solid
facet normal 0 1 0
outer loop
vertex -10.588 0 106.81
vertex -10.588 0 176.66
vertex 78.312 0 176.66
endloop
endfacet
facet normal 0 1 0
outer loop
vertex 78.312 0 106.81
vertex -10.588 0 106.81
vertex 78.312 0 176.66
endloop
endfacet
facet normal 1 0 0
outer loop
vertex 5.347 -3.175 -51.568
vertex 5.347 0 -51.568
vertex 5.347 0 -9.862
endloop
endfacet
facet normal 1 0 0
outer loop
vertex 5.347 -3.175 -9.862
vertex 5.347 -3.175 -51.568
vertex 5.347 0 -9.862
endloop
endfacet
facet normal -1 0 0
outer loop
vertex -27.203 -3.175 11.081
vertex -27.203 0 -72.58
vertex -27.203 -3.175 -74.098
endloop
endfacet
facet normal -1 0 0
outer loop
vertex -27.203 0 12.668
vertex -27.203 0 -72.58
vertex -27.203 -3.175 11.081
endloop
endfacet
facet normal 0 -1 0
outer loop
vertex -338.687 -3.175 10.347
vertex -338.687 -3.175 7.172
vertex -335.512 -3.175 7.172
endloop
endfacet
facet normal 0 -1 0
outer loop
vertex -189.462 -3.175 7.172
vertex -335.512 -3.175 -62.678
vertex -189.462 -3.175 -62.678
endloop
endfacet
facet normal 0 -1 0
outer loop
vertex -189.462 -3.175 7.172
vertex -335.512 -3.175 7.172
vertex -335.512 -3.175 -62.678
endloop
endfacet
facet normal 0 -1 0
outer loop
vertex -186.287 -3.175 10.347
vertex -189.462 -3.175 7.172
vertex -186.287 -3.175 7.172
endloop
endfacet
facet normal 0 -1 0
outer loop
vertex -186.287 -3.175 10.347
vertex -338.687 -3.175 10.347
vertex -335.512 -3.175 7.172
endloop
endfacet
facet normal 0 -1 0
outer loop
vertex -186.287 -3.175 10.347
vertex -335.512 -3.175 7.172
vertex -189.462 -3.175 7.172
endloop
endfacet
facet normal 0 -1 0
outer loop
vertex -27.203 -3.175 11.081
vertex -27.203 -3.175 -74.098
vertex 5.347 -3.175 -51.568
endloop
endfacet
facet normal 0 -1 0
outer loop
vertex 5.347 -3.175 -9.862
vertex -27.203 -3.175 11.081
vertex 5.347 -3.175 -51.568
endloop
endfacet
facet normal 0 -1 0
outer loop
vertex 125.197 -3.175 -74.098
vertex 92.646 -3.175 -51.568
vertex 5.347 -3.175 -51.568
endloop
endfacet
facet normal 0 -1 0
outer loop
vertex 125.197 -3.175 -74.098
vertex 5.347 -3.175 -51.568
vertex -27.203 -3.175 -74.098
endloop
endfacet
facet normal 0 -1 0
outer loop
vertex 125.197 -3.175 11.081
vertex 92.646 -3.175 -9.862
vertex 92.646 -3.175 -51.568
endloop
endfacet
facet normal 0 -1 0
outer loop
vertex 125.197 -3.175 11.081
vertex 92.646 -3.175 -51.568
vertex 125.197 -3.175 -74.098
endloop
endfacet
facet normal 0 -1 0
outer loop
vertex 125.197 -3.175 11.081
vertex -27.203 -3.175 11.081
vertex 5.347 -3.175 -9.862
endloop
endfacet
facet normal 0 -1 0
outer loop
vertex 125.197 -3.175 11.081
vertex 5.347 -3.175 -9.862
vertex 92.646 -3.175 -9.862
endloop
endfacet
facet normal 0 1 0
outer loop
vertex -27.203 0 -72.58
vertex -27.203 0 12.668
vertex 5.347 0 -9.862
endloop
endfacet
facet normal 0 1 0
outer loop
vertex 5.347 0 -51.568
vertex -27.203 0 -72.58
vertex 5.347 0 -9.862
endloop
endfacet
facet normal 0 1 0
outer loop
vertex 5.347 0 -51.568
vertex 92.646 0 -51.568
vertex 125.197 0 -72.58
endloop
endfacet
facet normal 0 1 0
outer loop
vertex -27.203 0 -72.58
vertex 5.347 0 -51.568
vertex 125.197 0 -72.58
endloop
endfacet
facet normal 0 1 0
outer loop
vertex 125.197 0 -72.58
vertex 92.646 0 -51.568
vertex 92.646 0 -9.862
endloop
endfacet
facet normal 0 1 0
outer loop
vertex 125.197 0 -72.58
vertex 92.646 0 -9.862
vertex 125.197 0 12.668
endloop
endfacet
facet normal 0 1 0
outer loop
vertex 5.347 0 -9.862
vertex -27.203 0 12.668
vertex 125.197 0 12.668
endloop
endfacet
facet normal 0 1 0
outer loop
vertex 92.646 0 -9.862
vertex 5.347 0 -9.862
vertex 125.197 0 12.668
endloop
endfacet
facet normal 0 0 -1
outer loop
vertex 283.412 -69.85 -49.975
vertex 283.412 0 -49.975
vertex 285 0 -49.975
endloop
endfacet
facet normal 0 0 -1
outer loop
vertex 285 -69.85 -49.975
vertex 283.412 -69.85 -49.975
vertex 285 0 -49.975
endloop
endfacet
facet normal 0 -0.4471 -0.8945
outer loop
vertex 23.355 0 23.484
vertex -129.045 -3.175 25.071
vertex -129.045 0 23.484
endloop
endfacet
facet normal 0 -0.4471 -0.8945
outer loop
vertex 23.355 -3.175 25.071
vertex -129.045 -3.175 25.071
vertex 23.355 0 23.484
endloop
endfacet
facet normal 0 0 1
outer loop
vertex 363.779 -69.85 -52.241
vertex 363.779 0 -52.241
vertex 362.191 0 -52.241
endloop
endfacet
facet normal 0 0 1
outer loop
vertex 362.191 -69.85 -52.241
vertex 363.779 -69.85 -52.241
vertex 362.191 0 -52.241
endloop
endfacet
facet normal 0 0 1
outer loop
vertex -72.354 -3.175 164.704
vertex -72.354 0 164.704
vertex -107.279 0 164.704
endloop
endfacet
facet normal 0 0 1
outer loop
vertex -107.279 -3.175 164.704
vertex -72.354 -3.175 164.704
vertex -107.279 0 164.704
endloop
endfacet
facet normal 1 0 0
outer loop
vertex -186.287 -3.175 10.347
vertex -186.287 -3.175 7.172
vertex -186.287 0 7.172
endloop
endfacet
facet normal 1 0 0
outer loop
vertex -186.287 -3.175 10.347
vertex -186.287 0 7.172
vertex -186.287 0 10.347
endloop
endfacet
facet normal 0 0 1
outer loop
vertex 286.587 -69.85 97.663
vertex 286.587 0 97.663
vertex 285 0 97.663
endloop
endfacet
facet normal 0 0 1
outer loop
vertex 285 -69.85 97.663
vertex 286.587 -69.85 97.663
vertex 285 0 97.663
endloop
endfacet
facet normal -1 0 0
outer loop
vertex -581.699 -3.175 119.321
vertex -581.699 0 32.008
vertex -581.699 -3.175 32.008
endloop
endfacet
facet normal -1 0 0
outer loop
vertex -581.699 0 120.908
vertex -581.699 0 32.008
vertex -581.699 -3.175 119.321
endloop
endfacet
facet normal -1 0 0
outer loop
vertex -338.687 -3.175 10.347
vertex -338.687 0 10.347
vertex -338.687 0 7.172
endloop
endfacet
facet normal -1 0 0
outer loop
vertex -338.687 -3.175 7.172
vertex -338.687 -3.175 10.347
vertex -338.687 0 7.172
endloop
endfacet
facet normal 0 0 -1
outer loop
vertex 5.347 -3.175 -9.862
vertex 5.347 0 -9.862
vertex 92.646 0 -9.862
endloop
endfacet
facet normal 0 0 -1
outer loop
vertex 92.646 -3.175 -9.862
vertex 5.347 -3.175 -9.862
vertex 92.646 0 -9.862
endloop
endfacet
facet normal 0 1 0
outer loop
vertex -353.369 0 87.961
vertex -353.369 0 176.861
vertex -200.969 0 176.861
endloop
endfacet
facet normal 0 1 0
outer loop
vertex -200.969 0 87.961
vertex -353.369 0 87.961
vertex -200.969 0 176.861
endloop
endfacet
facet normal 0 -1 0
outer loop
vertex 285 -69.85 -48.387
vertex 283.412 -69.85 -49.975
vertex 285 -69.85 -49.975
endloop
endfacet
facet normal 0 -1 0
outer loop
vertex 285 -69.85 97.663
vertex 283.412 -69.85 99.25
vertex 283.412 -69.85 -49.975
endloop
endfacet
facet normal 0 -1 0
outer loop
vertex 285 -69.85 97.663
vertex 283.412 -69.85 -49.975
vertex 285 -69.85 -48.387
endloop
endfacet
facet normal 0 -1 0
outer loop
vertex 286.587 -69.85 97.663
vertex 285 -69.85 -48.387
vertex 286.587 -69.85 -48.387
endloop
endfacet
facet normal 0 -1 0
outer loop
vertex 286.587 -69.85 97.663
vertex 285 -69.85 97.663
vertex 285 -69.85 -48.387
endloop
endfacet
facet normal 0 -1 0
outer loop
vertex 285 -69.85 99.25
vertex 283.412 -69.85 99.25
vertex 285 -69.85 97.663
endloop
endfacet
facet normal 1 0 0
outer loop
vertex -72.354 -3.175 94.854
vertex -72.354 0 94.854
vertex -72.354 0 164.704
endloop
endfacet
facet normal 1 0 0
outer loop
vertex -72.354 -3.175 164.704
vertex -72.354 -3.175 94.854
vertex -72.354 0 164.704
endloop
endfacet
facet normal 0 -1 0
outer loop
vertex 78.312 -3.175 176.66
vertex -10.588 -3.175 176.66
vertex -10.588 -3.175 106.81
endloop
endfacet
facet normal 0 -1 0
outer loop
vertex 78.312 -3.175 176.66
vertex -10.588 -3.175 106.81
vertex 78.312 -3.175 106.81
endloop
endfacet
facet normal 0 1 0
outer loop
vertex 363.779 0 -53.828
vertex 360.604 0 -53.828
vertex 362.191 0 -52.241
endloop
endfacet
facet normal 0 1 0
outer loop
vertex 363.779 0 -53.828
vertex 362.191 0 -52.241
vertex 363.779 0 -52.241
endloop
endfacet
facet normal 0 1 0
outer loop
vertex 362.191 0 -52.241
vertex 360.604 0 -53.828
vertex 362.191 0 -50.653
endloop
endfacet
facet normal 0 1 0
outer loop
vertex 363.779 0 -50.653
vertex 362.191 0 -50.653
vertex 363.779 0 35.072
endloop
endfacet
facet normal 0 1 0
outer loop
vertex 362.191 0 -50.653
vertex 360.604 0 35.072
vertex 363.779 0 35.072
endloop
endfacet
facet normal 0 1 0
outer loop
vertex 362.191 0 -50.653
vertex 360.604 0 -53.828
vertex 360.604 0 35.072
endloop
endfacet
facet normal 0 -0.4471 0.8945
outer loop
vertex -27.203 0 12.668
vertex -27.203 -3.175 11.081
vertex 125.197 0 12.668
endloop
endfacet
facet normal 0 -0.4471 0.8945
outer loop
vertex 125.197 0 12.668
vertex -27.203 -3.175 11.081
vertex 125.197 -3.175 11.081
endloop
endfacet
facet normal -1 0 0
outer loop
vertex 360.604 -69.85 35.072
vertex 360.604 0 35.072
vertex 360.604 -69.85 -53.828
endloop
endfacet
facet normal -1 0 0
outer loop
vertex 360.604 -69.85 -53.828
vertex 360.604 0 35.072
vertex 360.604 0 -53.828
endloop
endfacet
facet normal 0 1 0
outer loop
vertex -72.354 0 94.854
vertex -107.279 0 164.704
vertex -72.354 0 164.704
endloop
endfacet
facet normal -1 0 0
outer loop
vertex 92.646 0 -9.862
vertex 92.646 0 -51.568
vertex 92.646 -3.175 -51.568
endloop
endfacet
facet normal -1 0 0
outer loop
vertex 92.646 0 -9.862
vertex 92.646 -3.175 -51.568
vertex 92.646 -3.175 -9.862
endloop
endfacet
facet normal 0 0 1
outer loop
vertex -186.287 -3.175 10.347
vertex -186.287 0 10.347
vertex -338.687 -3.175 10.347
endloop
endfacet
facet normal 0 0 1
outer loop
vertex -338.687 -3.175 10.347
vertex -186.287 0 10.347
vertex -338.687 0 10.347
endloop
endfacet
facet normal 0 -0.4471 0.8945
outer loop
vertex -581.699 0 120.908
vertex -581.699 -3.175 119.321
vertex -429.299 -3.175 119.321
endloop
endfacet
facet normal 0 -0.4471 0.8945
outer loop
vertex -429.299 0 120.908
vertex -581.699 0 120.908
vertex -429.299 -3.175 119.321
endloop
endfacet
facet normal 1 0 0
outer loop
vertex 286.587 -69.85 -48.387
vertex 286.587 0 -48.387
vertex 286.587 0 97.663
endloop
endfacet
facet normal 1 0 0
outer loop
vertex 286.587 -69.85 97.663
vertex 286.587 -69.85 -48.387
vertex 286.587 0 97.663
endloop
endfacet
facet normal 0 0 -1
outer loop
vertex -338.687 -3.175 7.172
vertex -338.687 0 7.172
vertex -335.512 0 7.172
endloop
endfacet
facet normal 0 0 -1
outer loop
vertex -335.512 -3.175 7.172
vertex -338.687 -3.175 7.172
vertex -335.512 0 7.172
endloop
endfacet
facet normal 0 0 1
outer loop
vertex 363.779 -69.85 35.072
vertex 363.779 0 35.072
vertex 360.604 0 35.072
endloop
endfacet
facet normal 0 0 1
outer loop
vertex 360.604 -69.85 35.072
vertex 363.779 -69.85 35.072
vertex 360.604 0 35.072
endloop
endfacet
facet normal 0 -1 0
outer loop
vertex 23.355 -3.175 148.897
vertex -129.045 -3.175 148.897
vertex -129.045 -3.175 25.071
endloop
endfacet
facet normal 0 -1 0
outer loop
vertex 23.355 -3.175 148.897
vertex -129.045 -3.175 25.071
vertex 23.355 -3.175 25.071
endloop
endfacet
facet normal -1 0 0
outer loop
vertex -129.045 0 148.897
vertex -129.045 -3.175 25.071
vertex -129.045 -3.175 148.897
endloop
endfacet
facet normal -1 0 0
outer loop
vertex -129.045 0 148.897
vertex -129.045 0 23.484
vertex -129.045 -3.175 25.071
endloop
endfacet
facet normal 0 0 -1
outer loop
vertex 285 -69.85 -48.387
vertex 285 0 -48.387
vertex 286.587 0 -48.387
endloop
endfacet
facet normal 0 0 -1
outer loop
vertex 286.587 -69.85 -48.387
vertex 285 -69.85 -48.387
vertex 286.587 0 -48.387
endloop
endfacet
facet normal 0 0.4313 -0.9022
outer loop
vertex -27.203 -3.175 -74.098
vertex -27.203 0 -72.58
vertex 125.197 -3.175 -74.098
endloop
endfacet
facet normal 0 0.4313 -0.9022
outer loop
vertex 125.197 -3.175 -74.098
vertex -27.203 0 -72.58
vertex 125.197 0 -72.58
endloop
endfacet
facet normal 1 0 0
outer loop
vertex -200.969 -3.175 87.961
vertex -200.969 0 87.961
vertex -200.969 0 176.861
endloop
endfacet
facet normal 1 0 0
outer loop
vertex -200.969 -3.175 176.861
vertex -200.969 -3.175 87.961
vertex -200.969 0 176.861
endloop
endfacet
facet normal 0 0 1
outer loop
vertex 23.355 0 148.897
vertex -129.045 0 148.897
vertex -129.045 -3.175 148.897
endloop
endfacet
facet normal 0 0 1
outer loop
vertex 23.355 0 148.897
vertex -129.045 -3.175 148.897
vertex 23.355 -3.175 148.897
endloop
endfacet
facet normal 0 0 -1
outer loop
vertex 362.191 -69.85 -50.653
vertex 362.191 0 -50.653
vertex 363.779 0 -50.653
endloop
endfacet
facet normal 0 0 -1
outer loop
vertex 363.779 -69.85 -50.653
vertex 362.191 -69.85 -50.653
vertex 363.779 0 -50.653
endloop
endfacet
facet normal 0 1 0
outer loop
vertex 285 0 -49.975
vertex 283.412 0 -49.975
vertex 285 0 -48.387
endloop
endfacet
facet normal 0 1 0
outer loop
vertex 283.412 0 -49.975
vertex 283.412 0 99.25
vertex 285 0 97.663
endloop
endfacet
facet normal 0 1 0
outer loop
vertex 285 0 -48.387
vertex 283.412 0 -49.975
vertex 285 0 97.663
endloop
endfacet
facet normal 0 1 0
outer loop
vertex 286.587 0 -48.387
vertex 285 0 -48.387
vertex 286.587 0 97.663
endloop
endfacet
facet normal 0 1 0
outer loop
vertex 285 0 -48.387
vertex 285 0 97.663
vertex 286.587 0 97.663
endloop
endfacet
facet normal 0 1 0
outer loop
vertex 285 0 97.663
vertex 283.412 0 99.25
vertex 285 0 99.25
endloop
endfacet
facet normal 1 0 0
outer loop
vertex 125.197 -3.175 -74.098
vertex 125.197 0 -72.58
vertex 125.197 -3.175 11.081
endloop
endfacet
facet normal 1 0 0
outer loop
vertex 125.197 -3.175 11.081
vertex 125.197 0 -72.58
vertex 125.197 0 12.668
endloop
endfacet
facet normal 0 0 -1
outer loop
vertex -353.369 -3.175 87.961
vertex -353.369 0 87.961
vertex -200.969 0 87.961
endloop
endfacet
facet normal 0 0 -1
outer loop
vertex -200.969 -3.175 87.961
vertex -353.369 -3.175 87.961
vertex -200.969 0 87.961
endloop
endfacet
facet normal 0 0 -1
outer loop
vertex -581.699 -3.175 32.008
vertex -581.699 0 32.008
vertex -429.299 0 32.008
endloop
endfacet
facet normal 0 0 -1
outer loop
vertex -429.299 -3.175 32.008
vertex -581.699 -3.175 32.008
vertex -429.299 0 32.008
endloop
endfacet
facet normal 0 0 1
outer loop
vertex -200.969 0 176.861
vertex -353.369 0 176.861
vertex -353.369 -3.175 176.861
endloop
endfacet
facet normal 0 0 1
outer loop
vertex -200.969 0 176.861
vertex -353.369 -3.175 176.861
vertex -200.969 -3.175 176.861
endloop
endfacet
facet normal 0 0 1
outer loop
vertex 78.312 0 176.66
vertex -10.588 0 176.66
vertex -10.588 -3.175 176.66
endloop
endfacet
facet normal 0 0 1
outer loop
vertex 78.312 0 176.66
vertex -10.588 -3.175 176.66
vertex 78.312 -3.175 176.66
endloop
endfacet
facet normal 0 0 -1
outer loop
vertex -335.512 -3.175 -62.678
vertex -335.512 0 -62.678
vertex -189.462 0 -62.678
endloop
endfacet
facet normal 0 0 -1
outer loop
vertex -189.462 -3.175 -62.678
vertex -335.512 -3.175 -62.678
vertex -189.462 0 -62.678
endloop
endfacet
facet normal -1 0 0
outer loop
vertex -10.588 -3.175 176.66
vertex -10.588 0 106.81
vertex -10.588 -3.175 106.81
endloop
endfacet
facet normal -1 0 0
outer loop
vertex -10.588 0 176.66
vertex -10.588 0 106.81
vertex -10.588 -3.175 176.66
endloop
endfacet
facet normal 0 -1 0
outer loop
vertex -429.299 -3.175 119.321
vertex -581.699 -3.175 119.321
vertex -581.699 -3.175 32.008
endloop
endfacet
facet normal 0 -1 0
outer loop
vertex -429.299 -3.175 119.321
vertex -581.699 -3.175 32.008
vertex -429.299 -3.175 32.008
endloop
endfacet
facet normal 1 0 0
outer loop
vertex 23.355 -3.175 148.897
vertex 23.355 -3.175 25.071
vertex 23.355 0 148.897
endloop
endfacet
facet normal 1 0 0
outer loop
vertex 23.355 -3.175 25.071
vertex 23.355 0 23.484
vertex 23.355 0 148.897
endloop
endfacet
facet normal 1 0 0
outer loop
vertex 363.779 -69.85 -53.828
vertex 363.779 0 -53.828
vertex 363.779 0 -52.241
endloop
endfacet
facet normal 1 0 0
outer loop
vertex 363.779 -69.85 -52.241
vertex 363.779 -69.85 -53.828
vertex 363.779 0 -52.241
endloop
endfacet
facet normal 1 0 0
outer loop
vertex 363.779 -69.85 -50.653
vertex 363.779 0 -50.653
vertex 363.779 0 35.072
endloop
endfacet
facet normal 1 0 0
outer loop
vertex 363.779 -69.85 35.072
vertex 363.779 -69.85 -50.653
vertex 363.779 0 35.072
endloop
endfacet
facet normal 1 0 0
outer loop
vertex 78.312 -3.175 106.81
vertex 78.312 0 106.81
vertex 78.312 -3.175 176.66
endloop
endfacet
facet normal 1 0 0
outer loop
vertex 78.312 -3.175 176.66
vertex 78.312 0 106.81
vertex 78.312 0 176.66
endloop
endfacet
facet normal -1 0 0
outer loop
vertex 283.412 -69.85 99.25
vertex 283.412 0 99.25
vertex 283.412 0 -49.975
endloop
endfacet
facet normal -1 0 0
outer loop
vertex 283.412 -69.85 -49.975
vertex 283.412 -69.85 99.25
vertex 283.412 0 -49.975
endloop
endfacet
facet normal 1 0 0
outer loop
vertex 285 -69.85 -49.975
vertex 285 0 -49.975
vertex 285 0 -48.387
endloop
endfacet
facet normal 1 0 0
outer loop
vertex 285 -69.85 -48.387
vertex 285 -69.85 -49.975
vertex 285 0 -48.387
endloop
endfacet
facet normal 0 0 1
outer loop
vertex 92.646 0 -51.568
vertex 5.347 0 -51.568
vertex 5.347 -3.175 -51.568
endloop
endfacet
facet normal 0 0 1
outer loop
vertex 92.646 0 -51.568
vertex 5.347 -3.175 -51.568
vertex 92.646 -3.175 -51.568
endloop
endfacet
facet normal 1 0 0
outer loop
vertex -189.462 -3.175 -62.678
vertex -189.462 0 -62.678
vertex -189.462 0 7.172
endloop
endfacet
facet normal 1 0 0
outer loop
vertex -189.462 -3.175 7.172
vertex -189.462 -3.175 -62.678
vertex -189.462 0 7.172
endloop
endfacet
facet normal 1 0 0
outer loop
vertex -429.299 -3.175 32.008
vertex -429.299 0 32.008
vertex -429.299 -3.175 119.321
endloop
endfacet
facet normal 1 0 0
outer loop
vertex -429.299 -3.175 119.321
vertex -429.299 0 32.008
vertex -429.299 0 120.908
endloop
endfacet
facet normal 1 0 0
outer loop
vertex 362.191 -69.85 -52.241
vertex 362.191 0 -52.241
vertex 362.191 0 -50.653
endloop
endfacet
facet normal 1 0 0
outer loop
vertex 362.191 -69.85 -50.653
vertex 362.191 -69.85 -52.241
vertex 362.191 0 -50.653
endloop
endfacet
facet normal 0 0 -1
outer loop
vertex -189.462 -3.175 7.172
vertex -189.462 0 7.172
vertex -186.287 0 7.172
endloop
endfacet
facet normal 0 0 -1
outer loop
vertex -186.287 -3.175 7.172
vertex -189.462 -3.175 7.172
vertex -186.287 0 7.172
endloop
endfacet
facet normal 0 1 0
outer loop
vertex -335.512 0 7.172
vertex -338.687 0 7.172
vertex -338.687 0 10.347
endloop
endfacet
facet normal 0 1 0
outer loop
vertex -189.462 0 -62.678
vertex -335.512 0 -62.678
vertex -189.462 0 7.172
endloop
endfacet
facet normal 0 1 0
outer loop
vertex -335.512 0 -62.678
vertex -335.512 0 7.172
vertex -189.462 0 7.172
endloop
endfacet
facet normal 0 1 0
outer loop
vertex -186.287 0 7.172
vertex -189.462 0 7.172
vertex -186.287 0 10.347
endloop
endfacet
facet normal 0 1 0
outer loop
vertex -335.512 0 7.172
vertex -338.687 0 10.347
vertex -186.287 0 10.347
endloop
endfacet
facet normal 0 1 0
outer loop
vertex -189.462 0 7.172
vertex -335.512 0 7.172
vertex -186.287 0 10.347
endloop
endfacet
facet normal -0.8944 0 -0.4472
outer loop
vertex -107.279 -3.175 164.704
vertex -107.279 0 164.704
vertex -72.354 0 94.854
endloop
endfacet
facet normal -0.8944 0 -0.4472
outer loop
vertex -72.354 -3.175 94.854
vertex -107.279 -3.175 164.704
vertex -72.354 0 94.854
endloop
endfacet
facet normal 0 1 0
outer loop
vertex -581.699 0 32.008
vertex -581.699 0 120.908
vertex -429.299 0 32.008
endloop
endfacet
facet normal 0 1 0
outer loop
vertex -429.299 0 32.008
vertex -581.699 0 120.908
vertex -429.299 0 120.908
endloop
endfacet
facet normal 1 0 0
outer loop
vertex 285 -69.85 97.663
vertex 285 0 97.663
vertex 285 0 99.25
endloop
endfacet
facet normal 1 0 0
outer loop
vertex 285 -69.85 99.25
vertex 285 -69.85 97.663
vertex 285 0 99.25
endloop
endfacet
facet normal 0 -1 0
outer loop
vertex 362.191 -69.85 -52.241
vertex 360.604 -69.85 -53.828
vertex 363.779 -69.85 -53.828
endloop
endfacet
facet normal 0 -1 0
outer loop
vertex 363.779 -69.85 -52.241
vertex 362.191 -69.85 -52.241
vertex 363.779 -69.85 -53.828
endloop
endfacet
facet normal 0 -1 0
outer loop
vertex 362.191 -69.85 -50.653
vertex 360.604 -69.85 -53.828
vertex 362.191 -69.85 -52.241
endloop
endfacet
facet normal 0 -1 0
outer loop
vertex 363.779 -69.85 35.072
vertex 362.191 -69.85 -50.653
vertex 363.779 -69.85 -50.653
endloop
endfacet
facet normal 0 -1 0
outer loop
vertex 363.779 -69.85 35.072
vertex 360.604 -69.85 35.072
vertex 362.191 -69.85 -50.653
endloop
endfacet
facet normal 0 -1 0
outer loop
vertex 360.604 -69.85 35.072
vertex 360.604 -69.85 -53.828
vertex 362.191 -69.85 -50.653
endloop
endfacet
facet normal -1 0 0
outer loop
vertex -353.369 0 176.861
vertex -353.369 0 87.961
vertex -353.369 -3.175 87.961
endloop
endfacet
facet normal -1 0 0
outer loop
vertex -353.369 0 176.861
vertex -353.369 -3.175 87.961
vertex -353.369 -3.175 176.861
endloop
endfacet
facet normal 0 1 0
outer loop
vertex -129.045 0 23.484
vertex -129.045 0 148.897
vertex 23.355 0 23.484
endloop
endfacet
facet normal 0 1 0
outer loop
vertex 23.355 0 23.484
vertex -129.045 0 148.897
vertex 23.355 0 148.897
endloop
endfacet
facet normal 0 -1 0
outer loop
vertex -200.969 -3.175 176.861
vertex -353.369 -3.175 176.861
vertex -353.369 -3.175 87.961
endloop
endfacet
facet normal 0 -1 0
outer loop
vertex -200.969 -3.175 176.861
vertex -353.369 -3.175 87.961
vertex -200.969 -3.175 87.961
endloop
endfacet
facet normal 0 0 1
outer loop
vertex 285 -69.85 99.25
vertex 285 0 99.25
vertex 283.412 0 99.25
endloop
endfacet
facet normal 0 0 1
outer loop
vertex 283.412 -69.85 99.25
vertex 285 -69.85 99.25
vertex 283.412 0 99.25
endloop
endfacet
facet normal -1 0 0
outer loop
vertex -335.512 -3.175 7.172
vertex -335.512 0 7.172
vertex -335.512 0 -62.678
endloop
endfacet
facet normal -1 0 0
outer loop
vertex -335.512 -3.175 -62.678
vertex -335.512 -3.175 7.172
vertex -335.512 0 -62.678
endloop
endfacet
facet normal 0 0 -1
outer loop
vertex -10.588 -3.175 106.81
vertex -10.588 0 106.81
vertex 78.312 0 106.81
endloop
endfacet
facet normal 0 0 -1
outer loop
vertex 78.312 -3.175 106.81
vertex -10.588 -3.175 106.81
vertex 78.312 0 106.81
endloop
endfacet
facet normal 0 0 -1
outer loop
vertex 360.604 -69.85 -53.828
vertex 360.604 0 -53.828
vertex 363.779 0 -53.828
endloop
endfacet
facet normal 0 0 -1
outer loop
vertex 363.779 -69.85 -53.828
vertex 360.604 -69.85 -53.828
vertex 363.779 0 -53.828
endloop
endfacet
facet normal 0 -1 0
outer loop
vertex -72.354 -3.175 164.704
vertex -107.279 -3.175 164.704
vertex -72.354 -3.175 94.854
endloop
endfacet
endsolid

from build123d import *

# Parameters (mm, degrees)
F0_W      = 152.4
F0_H      = 86.7664
F0_W_2    = 87.2998
F0_H_2    = 41.7068
F1_DEPTH  = 3.175
F2_W      = 152.4
F2_H      = 125.4125
F3_DEPTH  = 3.175
F5_DEPTH  = 3.175
F6_W      = 152.4
F6_H      = 88.9
F7_DEPTH  = 3.175
F9_DEPTH  = 3.175
F10_W     = 88.9
F10_H     = 69.85
F11_DEPTH = 3.175
F12_SIZE2 = 1.518471
F12_SIZE  = 3.17499
F13_SIZE2 = 1.58714
F13_SIZE  = 3.17499
F14_W     = 152.4
F14_H     = 88.9
F15_DEPTH = 3.175
F16_SIZE2 = 1.58714
F16_SIZE  = 3.17499
F17_SIZE2 = 1.58714
F17_SIZE  = 3.17499
F19_DEPTH = 69.85
F21_DEPTH = 69.85


# Not quite as in the source:
# - a fillet or chamfer is up to 0.001 mm smaller than in the source, because OpenCascade refuses the exact size


with BuildPart() as f1:
    # F0 (on Front) → F1 (new body)
    with BuildSketch(Plane.XZ):
        with Locations((48.9966, -30.7150018784)):
            Rectangle(F0_W, F0_H)
        with Locations((48.9966, -30.7150018784)):
            Rectangle(F0_W_2, F0_H_2, mode=Mode.SUBTRACT)
    extrude(amount=F1_DEPTH)

    # F12 (size 3.175 and 1.5184806323 in the source; OpenCascade refuses exactly that, so slightly less here)
    f12_edges = [f1.edges().sort_by_distance(p)[0] for p in [
        (48.9966, 0, -74.098202),
    ]]
    f12_side = f1.faces().sort_by_distance((48.9966, -1.5875, -74.098202))[0]
    chamfer(f12_edges, length=F12_SIZE, length2=F12_SIZE2, reference=f12_side)

    # F13 (size 3.175 and 1.5871501317 in the source; OpenCascade refuses exactly that, so slightly less here)
    f13_edges = [f1.edges().sort_by_distance(p)[0] for p in [
        (48.9966, -3.175, 12.668198),
    ]]
    f13_side = f1.faces().sort_by_distance((48.9966, -1.5875, 12.668198))[0]
    chamfer(f13_edges, length=F13_SIZE, length2=F13_SIZE2, reference=f13_side)


with BuildPart() as f3:
    # F2 (on Front) → F3 (new body)
    with BuildSketch(Plane.XZ):
        with Locations((-52.8449798107, 86.1903589696)):
            Rectangle(F2_W, F2_H)
    extrude(amount=F3_DEPTH)

    # F17 (size 3.175 and 1.5871501317 in the source; OpenCascade refuses exactly that, so slightly less here)
    f17_edges = [f3.edges().sort_by_distance(p)[0] for p in [
        (-52.84498, -3.175, 23.484109),
    ]]
    f17_side = f3.faces().sort_by_distance((-52.84498, -1.5875, 23.484109))[0]
    chamfer(f17_edges, length=F17_SIZE, length2=F17_SIZE2, reference=f17_side)


with BuildPart() as f5:
    # F4 (on Front) → F5 (new body)
    with BuildSketch(Plane.XZ):
        Polygon((-335.5122112751, -62.6780449331), (-189.4622112751, -62.6780449331), (-189.4622112751, 7.1719550669), (-186.2872112751, 7.1719550669), (-186.2872112751, 10.3469550669), (-338.6872112751, 10.3469550669), (-338.6872112751, 7.1719550669), (-335.5122112751, 7.1719550669), align=None)
    extrude(amount=F5_DEPTH)


with BuildPart() as f7:
    # F6 (on Front) → F7 (new body)
    with BuildSketch(Plane.XZ):
        with Locations((-277.1691465855, 132.4105263472)):
            Rectangle(F6_W, F6_H)
    extrude(amount=F7_DEPTH)


with BuildPart() as f9:
    # F8 (on Front) → F9 (new body)
    with BuildSketch(Plane.XZ):
        Polygon((-107.2789654136, 164.7035479546), (-72.3539654136, 94.8535479546), (-72.3539654136, 164.7035479546), align=None)
    extrude(amount=F9_DEPTH)


with BuildPart() as f11:
    # F10 (on Front) → F11 (new body)
    with BuildSketch(Plane.XZ):
        with Locations((33.8623570919, 141.7346980453)):
            Rectangle(F10_W, F10_H)
    extrude(amount=F11_DEPTH)


with BuildPart() as f15:
    # F14 (on Front) → F15 (new body)
    with BuildSketch(Plane.XZ):
        with Locations((-505.4994225502, 76.4577066326)):
            Rectangle(F14_W, F14_H)
    extrude(amount=F15_DEPTH)

    # F16 (size 3.175 and 1.5871501317 in the source; OpenCascade refuses exactly that, so slightly less here)
    f16_edges = [f15.edges().sort_by_distance(p)[0] for p in [
        (-505.499423, -3.175, 120.907707),
    ]]
    f16_side = f15.faces().sort_by_distance((-505.499423, -1.5875, 120.907707))[0]
    chamfer(f16_edges, length=F16_SIZE, length2=F16_SIZE2, reference=f16_side)


with BuildPart() as f19:
    # F18 (on Front) → F19 (new body)
    with BuildSketch(Plane.XZ):
        Polygon((363.7785966866, 35.07166363), (360.6035966866, 35.07166363), (360.6035966866, -53.82833637), (363.7785966866, -53.82833637), (363.7785966866, -52.24083637), (362.1910966866, -52.24083637), (362.1910966866, -50.65333637), (363.7785966866, -50.65333637), align=None)
    extrude(amount=F19_DEPTH)


with BuildPart() as f21:
    # F20 (on Front) → F21 (new body)
    with BuildSketch(Plane.XZ):
        Polygon((284.9999441053, 97.662555486), (284.9999441053, 99.250055486), (283.4124441053, 99.250055486), (283.4124441053, -49.974944514), (284.9999441053, -49.974944514), (284.9999441053, -48.387444514), (286.5874441053, -48.387444514), (286.5874441053, 97.662555486), align=None)
    extrude(amount=F21_DEPTH)


solid = Compound([f1.part, f3.part, f5.part, f7.part, f9.part, f11.part, f15.part, f19.part, f21.part])
